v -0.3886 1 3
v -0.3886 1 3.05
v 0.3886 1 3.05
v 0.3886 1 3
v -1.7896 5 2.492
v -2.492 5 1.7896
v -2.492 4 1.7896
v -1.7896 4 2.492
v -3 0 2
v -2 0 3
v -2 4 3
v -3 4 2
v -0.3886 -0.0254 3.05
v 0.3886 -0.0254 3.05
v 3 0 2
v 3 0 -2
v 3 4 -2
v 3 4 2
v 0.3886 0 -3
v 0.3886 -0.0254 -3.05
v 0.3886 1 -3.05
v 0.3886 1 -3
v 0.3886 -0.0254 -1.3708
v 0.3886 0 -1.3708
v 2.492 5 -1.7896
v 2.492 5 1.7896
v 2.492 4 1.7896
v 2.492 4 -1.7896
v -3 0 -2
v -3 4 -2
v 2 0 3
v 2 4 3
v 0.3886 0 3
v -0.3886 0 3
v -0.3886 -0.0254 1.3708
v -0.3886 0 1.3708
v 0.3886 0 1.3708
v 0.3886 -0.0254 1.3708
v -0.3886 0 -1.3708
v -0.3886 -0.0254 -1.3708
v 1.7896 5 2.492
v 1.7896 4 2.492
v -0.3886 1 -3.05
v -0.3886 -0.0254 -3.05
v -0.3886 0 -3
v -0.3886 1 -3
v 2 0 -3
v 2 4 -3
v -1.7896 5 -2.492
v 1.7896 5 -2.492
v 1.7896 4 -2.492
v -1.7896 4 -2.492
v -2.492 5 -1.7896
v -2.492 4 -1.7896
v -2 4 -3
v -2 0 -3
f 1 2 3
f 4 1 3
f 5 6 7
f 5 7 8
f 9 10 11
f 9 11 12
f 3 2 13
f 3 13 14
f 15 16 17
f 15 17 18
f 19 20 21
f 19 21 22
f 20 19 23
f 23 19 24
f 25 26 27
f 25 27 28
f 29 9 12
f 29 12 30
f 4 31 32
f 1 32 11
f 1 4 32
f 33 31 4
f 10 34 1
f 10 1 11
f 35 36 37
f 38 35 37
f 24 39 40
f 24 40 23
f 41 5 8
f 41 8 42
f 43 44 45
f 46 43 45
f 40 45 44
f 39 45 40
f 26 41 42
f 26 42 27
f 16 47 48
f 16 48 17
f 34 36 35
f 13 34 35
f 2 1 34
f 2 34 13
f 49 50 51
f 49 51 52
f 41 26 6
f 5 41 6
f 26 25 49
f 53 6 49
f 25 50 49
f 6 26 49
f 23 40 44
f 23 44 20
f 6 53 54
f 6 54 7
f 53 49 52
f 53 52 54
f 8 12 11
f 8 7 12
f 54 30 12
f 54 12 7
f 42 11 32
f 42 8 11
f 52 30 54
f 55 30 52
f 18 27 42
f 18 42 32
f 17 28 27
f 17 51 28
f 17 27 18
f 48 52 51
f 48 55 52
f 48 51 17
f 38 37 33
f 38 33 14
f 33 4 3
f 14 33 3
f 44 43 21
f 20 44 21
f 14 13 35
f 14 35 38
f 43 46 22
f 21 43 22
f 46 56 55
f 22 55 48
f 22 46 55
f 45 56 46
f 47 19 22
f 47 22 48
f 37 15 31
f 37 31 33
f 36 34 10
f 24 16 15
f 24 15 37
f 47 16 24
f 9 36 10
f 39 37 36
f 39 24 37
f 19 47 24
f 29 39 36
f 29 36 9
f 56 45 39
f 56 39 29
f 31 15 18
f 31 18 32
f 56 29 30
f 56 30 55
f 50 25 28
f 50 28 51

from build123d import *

# Parameters (mm, degrees)
BOSS_EXTRUDE1_DEPTH      = 5
CUT_EXTRUDE1_DEPTH       = 1
BOSS_EXTRUDE2_DEPTH      = 0.0254
BOSS_EXTRUDE2_DEPTH_BACK = 1
SKETCH3_W                = 0.777152918
SKETCH3_H                = 1.679205413


with BuildPart() as part:
    # Sketch1 → Boss-Extrude1 (new body)
    with BuildSketch(Plane(origin=(0, 0, 0), x_dir=(1, 0, 0), z_dir=(0, 1, 0))):
        Polygon((-3, 2), (-2, 3), (2, 3), (3, 2), (3, -2), (2, -3), (-2, -3), (-3, -2), align=None)
    extrude(amount=BOSS_EXTRUDE1_DEPTH)

    # Sketch2 → Cut-Extrude1 (cut)
    with BuildSketch(Plane(origin=(0, 5, 0), x_dir=(1, 0, 0), z_dir=(0, 1, 0))):
        Polygon((3, -2), (3, 2), (2, 3), (-2, 3), (-3, 2), (-3, -2), (-2, -3), (2, -3), align=None)
        Polygon((2.492, -1.78957951), (2.492, 1.78957951), (1.78957951, 2.492), (-1.78957951, 2.492), (-2.492, 1.78957951), (-2.492, -1.78957951), (-1.78957951, -2.492), (1.78957951, -2.492), align=None, mode=Mode.SUBTRACT)
    extrude(amount=-CUT_EXTRUDE1_DEPTH, mode=Mode.SUBTRACT)

    # Sketch3 → Boss-Extrude2 (add, two sides: drawn at the far end of the back side and taken through both)
    with BuildSketch(Plane.XZ.offset(-BOSS_EXTRUDE2_DEPTH_BACK)):
        with Locations((0, 2.210397294)):
            Rectangle(SKETCH3_W, SKETCH3_H)
        with Locations((0, -2.210397294)):
            Rectangle(SKETCH3_W, SKETCH3_H)
    extrude(amount=BOSS_EXTRUDE2_DEPTH + BOSS_EXTRUDE2_DEPTH_BACK)


solid = part.part
